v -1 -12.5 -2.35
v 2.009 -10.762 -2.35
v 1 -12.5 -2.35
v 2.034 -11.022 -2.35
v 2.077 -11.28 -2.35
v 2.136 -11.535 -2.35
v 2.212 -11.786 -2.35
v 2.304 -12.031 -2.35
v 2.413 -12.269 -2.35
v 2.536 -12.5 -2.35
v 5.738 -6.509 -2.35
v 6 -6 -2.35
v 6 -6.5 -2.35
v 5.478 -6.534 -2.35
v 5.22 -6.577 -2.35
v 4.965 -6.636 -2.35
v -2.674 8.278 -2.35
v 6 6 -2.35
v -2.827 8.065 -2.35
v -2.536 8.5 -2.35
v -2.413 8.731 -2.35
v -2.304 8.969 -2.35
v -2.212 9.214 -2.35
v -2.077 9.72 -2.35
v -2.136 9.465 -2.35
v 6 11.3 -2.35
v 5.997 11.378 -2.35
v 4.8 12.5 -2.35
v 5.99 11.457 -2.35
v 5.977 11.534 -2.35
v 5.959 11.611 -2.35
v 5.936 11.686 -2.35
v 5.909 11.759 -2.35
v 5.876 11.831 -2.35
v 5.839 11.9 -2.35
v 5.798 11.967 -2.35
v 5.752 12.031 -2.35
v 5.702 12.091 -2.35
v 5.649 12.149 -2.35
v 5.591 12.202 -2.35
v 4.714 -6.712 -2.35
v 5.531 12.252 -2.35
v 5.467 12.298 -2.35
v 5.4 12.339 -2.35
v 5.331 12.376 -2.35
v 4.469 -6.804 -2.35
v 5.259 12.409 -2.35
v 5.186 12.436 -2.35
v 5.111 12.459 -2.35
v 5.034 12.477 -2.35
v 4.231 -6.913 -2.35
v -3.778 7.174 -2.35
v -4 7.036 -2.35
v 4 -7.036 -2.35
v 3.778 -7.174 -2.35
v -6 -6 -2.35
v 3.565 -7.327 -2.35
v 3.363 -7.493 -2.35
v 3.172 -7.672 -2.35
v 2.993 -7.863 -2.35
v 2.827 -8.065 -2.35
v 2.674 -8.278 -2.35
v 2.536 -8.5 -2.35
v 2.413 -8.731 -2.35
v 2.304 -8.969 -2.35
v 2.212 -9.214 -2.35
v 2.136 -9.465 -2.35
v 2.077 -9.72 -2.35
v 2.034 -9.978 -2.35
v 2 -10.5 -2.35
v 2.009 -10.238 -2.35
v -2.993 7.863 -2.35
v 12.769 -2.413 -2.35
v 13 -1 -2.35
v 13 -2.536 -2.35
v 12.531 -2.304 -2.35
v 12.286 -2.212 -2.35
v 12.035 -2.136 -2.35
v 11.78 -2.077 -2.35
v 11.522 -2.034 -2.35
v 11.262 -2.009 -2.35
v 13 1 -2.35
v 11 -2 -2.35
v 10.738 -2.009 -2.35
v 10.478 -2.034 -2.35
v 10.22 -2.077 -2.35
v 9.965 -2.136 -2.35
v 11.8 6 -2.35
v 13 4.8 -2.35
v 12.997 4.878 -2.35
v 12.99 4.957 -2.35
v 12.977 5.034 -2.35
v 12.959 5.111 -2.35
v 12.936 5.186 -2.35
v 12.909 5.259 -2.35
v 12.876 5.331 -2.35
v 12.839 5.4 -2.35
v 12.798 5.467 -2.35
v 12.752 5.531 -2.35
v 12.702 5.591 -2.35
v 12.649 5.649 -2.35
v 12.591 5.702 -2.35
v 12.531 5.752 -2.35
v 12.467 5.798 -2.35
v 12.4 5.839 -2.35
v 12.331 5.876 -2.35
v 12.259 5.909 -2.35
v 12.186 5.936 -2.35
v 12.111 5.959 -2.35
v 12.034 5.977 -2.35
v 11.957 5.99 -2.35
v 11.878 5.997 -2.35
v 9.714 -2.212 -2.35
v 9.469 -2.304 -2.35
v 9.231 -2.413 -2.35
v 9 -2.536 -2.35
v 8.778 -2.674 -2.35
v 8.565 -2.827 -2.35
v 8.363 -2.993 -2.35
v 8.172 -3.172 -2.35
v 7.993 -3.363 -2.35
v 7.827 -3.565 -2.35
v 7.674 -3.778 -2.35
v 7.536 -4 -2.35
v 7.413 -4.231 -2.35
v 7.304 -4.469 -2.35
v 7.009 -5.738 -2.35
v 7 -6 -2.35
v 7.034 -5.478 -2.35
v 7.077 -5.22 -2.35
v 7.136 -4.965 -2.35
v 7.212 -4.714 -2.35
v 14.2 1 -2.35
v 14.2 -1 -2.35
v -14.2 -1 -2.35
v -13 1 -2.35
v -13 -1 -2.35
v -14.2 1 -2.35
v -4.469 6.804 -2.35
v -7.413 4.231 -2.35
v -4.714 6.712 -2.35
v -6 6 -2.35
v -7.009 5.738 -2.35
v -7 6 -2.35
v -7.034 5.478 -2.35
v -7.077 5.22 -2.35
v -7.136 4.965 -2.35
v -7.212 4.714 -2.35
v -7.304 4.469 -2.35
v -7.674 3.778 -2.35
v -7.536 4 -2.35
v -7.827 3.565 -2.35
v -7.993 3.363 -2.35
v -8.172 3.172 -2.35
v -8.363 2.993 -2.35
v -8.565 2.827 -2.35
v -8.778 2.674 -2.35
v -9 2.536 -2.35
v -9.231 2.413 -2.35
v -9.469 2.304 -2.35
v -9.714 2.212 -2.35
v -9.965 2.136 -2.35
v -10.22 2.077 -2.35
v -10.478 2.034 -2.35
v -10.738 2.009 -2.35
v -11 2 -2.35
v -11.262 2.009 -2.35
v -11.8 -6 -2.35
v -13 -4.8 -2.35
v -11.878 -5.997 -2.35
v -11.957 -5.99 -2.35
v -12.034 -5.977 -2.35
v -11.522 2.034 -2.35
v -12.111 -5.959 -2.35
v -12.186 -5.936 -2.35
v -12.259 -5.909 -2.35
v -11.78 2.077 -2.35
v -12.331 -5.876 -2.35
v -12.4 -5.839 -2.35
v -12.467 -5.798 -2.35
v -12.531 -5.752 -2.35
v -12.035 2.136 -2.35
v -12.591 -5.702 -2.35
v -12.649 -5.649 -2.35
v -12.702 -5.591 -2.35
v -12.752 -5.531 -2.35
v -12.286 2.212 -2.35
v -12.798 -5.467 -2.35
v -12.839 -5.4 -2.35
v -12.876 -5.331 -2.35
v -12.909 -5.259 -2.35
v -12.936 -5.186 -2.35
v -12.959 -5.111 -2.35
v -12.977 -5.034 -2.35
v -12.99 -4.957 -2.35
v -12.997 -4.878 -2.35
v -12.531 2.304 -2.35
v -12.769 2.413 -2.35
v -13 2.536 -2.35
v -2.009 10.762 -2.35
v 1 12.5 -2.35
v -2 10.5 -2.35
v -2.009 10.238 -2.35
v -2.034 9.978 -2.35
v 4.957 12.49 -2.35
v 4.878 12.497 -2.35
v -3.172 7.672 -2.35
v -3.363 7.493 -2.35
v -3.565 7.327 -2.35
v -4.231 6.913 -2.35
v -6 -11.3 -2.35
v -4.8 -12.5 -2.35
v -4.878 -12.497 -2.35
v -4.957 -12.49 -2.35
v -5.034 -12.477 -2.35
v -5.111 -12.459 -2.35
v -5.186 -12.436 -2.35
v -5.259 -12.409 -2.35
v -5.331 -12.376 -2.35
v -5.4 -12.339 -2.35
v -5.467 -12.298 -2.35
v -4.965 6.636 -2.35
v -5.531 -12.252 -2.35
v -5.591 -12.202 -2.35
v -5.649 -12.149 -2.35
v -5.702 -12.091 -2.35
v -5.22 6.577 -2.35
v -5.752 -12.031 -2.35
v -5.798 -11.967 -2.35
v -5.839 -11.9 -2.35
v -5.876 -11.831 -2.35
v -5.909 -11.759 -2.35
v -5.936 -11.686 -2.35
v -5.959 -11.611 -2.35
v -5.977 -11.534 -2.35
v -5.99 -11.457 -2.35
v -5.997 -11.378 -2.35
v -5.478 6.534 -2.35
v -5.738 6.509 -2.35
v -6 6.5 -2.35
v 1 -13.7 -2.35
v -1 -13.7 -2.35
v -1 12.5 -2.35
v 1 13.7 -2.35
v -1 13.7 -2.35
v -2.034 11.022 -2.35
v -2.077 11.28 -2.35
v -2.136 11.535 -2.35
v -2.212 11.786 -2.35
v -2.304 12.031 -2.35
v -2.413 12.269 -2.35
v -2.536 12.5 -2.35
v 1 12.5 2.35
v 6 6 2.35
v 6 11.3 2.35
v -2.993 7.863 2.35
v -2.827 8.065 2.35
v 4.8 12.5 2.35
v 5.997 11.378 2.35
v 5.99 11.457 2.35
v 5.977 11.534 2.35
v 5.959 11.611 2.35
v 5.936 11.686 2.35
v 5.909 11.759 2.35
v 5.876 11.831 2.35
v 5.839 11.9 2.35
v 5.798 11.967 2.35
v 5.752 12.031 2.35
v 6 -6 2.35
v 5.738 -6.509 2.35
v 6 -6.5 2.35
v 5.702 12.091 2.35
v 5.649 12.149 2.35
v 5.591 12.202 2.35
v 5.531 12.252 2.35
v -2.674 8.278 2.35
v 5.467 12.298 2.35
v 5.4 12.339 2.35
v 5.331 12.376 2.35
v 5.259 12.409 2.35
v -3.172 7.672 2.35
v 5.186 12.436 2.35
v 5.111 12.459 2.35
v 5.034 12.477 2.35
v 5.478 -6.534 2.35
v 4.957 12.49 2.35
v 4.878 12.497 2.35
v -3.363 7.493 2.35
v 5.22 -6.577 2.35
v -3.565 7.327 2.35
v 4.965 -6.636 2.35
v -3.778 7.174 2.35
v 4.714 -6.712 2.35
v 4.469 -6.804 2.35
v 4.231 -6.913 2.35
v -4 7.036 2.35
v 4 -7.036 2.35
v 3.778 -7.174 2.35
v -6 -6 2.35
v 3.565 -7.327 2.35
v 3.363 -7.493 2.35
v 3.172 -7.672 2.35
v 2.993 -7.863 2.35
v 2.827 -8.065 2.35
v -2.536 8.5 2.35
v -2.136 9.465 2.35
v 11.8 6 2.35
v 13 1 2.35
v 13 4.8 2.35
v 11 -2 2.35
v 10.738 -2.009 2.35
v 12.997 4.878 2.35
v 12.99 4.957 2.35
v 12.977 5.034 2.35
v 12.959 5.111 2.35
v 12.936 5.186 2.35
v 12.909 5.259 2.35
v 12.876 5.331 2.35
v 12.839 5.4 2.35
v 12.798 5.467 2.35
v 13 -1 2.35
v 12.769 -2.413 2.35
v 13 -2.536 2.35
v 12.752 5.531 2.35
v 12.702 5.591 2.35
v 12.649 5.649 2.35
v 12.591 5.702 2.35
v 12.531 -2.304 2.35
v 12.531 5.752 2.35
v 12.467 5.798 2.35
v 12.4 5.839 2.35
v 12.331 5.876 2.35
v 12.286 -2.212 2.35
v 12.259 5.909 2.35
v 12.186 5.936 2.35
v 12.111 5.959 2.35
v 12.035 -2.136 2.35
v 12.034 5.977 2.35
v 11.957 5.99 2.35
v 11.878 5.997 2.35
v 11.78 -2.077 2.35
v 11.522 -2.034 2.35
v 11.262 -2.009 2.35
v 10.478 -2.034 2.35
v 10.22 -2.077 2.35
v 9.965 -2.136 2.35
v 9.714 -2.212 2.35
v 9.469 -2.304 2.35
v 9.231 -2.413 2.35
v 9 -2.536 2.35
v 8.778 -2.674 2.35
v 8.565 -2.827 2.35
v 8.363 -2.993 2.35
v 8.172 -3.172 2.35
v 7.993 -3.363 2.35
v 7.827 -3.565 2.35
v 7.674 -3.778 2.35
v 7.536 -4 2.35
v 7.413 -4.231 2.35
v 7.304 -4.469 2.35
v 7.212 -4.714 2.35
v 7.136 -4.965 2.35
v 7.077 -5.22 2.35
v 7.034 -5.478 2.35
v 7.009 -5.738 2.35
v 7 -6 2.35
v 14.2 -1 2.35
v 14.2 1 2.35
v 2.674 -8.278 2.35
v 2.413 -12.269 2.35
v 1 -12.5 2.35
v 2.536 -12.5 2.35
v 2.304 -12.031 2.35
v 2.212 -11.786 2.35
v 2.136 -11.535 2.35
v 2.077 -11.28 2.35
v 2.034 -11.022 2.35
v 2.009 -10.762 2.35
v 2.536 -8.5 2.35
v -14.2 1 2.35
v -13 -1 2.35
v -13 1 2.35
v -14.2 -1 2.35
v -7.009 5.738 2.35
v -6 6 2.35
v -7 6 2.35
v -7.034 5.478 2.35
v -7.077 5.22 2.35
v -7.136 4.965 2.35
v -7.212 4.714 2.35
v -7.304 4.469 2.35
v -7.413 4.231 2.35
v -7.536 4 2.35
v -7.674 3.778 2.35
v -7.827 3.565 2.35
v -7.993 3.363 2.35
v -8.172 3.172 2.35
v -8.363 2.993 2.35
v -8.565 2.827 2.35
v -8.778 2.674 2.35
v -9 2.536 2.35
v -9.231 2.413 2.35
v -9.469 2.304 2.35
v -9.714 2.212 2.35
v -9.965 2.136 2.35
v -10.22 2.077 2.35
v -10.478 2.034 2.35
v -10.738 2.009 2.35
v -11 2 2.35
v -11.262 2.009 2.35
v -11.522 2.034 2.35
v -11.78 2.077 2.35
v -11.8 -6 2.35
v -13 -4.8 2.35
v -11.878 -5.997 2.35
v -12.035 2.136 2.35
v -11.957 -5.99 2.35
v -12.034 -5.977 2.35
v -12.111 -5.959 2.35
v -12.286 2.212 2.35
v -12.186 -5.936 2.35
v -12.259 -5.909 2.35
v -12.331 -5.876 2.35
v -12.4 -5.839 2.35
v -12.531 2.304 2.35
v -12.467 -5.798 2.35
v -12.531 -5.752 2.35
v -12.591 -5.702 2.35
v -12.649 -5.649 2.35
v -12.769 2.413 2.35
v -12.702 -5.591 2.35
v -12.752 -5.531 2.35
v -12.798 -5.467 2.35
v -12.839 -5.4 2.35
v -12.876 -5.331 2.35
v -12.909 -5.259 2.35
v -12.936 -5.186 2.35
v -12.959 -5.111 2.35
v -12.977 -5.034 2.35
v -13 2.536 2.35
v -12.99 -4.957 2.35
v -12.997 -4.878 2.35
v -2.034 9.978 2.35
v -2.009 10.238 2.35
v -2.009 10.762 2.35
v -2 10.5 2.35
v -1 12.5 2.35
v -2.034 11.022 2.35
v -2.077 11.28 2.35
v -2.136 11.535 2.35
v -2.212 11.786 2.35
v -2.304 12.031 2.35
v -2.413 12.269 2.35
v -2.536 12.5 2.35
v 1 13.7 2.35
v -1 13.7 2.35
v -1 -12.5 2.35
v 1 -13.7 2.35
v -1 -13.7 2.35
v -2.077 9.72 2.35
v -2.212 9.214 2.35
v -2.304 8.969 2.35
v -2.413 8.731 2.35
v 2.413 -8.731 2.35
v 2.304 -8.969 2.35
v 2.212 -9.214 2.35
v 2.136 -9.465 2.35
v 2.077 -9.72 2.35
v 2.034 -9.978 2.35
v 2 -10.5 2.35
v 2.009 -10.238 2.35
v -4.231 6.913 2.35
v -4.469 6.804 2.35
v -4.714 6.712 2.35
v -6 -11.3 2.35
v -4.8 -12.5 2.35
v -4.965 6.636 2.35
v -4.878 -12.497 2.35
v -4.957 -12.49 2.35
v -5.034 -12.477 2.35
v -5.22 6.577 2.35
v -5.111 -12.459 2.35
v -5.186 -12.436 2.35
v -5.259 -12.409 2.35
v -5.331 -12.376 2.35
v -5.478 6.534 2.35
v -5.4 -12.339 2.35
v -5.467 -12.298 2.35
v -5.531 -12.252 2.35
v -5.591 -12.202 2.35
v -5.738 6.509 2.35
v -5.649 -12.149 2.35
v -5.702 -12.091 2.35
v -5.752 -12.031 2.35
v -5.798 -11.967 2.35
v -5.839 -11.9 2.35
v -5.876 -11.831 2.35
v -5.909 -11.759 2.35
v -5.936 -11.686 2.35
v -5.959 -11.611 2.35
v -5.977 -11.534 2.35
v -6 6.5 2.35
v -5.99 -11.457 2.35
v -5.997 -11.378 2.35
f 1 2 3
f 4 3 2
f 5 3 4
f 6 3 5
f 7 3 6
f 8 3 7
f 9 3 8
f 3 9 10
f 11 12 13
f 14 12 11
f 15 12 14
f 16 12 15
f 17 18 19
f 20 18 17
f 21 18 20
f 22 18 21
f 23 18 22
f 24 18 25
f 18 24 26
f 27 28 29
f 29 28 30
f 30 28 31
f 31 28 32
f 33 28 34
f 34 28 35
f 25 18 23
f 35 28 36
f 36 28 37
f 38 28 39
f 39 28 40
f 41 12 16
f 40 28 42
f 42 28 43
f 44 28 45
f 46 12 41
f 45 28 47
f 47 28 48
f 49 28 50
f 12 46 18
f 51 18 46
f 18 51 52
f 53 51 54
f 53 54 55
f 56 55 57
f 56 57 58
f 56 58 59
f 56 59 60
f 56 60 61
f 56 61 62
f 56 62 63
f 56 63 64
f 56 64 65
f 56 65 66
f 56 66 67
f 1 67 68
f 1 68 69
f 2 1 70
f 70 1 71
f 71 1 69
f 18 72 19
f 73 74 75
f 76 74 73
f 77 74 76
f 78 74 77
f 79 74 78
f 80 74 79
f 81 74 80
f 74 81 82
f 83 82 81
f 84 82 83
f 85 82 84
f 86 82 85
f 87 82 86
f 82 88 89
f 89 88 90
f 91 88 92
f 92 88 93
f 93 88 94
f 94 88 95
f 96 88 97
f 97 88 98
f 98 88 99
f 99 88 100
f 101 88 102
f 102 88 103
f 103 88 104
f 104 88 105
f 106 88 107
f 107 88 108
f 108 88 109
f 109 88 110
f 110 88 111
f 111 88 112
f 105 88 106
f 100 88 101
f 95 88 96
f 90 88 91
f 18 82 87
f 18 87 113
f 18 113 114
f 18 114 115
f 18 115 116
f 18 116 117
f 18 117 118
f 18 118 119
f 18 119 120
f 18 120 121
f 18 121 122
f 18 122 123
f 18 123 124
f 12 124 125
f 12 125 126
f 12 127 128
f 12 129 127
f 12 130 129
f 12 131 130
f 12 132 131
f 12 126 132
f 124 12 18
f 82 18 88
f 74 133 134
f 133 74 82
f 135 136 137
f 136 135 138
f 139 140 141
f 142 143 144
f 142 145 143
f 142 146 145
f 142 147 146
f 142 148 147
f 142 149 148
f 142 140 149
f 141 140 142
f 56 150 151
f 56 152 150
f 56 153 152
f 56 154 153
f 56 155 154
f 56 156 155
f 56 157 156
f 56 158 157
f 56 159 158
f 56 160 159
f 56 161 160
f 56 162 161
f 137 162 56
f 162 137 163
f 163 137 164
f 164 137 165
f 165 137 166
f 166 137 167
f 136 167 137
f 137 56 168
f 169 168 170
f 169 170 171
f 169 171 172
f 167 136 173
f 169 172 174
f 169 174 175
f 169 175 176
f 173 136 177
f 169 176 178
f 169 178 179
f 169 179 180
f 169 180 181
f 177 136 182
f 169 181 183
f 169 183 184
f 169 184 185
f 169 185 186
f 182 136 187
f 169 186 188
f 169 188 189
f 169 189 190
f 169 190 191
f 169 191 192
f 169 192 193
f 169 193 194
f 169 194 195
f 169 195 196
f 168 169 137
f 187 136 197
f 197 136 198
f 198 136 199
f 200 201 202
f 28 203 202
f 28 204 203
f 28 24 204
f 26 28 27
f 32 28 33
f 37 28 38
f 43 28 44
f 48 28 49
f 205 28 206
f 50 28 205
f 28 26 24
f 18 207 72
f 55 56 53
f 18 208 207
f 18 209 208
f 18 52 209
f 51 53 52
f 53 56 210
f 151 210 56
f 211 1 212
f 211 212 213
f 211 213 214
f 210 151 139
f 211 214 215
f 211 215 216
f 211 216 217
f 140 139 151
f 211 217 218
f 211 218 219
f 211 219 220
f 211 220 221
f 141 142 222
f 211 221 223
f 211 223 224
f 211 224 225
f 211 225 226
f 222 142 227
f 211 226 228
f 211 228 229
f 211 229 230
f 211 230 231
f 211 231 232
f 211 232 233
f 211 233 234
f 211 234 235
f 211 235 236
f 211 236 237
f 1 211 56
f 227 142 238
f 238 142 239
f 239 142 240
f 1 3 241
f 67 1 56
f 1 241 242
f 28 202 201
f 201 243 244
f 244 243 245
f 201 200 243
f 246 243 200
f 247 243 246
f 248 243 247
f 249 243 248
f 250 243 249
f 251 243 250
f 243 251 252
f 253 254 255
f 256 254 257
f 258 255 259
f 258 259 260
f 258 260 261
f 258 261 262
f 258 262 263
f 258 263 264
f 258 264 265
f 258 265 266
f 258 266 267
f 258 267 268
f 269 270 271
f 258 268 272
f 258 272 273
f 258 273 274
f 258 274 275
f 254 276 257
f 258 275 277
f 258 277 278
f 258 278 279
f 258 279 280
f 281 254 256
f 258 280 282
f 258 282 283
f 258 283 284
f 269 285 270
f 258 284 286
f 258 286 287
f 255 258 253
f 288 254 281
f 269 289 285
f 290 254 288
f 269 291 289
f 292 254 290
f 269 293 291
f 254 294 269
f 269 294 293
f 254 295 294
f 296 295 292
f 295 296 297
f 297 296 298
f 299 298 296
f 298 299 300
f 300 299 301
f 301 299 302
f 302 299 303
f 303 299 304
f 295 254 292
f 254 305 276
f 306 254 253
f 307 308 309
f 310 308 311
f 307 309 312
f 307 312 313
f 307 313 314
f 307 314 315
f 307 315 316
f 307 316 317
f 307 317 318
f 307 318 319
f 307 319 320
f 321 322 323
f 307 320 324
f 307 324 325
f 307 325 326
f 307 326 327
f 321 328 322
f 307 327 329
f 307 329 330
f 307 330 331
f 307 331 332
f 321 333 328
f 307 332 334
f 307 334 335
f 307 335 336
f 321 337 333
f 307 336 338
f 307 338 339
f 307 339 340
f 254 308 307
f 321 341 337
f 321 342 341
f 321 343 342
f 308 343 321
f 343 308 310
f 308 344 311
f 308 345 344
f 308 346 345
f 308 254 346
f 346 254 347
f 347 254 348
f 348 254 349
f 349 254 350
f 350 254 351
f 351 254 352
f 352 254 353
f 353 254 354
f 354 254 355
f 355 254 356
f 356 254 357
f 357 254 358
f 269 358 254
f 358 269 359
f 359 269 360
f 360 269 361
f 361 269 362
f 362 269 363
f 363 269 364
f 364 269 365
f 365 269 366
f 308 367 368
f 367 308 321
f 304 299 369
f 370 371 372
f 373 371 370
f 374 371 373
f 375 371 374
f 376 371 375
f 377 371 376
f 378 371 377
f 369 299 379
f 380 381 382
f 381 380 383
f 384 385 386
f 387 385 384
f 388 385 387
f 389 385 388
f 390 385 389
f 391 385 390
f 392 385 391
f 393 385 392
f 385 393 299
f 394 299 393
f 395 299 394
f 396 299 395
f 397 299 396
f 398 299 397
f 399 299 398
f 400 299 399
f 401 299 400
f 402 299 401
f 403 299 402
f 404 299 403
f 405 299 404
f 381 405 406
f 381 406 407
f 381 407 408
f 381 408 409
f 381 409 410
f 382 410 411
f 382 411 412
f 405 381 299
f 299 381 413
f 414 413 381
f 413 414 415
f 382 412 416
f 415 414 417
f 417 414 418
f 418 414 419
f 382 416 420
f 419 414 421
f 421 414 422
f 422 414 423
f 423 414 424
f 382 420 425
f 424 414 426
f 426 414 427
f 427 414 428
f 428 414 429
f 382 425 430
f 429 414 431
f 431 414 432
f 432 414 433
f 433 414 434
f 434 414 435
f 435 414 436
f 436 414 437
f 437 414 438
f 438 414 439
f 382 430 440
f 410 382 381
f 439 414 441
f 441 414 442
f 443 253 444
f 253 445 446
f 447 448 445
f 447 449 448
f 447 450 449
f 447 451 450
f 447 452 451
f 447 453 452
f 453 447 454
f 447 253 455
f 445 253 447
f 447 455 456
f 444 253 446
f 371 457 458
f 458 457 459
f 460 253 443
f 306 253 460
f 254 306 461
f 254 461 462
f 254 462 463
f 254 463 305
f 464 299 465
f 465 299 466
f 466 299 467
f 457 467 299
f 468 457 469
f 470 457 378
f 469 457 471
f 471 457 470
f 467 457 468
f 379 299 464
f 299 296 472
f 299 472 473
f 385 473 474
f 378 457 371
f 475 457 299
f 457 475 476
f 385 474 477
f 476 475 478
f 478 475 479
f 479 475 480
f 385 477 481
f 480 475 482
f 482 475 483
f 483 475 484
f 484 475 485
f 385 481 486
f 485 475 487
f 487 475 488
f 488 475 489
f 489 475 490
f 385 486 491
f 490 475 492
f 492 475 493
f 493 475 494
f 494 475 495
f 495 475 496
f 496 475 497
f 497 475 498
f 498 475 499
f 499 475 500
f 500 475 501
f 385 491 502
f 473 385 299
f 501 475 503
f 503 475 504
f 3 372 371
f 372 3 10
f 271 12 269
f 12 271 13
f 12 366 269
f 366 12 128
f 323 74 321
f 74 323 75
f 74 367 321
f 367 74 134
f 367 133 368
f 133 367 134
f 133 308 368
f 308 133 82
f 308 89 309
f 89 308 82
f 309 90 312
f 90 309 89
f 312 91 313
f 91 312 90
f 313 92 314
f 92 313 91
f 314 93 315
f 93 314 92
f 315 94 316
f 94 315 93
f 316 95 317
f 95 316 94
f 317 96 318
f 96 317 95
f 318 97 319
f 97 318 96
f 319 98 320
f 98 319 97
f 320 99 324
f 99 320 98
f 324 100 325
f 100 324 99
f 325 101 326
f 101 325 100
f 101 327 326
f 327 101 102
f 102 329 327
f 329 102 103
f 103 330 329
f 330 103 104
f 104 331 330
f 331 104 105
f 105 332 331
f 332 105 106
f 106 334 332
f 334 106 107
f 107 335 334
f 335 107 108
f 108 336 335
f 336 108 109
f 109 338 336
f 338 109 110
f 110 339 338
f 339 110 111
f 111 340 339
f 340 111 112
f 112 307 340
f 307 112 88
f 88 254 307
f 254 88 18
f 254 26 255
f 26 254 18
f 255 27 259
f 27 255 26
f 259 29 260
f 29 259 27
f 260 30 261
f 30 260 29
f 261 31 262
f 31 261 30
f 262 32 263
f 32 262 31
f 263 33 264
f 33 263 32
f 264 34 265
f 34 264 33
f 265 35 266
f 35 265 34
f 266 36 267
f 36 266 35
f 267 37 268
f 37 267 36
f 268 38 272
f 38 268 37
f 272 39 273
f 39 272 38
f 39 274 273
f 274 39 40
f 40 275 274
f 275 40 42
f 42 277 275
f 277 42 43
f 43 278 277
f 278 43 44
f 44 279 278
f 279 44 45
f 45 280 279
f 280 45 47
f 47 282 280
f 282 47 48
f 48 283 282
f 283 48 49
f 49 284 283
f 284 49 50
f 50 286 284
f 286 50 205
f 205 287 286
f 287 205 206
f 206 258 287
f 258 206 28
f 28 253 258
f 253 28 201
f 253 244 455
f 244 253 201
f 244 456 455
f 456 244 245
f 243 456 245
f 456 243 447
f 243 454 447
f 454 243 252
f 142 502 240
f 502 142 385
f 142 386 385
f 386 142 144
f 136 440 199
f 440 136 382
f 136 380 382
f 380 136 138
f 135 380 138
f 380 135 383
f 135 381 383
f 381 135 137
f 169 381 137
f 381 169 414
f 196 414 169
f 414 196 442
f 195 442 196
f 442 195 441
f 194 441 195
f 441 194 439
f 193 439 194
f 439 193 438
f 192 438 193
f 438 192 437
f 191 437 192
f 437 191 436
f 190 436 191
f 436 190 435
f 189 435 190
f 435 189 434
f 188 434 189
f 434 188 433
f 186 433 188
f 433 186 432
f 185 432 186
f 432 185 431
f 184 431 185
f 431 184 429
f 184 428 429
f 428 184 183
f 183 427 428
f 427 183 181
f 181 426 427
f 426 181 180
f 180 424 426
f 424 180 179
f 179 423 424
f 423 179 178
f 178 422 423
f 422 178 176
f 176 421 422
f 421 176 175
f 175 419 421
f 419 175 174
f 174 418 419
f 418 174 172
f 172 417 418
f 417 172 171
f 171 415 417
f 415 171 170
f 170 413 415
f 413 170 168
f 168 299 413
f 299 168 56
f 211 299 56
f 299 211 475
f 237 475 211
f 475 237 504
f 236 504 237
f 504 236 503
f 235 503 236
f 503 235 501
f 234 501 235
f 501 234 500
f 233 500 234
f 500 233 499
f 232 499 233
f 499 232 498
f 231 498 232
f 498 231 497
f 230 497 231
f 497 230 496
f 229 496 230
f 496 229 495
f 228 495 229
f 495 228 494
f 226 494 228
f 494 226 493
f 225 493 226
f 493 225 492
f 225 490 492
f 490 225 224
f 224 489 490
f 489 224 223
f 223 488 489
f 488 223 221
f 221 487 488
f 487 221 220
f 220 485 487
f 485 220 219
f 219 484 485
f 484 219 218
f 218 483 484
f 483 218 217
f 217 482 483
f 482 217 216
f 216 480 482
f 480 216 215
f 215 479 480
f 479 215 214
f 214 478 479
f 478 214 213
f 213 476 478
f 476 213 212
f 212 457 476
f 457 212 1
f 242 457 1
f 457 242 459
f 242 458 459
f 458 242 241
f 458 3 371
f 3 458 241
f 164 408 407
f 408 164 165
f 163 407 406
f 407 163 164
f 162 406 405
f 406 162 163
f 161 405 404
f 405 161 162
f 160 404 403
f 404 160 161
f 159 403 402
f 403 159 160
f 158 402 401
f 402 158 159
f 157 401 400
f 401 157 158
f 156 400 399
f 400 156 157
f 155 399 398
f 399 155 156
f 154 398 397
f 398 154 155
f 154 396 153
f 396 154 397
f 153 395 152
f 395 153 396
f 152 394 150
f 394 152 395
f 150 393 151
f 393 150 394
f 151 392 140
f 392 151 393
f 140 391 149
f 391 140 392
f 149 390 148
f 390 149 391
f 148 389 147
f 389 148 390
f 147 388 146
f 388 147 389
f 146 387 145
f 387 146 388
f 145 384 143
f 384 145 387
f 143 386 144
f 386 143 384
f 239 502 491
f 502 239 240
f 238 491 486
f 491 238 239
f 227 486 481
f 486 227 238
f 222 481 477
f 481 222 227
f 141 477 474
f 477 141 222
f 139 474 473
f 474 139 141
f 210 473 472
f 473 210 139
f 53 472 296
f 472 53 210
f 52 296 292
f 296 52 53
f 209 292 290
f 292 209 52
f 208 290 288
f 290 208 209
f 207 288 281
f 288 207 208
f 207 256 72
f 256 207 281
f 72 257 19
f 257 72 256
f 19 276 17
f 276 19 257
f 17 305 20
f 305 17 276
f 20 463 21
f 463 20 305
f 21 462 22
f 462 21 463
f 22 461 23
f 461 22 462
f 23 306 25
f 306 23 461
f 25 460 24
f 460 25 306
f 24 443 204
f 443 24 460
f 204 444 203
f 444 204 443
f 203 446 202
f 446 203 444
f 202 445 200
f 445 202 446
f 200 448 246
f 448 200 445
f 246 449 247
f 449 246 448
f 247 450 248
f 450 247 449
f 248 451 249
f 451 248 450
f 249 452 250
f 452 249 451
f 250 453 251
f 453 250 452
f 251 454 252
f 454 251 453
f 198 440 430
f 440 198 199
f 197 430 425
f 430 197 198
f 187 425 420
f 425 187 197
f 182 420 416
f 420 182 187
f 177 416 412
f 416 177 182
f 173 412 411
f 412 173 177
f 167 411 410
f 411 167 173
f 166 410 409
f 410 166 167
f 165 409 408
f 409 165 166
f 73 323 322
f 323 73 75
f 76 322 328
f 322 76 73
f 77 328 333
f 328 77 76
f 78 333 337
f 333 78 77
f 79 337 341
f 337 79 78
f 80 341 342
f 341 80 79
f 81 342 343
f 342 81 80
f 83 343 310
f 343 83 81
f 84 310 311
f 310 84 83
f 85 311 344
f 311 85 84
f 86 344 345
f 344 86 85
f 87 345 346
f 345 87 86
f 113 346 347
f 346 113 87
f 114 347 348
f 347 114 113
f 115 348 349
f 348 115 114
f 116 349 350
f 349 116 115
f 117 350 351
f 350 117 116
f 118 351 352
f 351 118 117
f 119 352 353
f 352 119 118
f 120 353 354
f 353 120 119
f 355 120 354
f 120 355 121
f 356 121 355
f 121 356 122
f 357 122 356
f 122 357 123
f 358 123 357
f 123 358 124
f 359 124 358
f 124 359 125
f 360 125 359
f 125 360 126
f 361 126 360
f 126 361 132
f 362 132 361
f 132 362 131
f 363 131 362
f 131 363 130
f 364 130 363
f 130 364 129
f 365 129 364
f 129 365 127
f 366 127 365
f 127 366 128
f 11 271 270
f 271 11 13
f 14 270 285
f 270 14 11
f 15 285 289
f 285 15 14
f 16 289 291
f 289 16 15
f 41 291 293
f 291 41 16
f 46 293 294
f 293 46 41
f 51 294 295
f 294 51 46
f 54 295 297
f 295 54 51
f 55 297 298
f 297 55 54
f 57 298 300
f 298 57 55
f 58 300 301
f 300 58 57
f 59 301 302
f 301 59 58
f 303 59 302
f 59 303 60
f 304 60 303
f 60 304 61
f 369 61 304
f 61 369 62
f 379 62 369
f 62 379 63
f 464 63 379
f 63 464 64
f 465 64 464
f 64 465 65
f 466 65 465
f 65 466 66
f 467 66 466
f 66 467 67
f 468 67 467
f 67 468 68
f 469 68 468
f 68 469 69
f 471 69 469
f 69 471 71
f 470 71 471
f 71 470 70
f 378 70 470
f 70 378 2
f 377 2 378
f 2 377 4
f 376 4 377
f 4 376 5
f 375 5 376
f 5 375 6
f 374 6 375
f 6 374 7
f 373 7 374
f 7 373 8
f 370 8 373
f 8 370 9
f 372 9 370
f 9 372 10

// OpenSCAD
$fn = 96;

// A extrusion bracket overall size: [26, 25, 4.7]
overall_x = 26;
overall_y = 25;
thickness = 4.7;

// Cross arm widths (chosen to match the shown "plus" silhouette)
arm_w_y = 12;  // width of horizontal arm (in Y)
arm_w_x = 12;  // width of vertical arm (in X)

// Outer corner rounding
corner_r = 1.2;

// Semicircular side cutouts (as in the renders)
cutout_d = 8.0;
cutout_r = cutout_d/2;

// How far the cutout centers sit from the outer edge (controls "bite" depth)
cutout_edge_inset = 2.0;

// Robust boolean overlap
eps = 0.25;

// Connectivity fix: add a thin "web" that bridges any accidental slice segmentation
// seen in some renderers/exports (1–2mm overlap requirement).
bridge_overlap = 1.2;   // mm (ensures continuous solid along length)
bridge_w = 2.0;         // mm (thin, does not change silhouette noticeably)

// 2D rounded rectangle centered at origin
module rounded_rect_centered_2d(w, h, r) {
    r2 = min(r, w/2, h/2);
    hull() {
        translate([ w/2 - r2,  h/2 - r2]) circle(r=r2);
        translate([-w/2 + r2,  h/2 - r2]) circle(r=r2);
        translate([ w/2 - r2, -h/2 + r2]) circle(r=r2);
        translate([-w/2 + r2, -h/2 + r2]) circle(r=r2);
    }
}

// Base "plus" plate (one connected solid)
module plus_plate_2d() {
    union() {
        // Horizontal bar: overall_x by arm_w_y
        rounded_rect_centered_2d(overall_x, arm_w_y, corner_r);

        // Vertical bar: arm_w_x by overall_y
        rounded_rect_centered_2d(arm_w_x, overall_y, corner_r);

        // Structural bridge web (ensures no thin slice-like disconnected segments)
        // Overlaps both bars by bridge_overlap to guarantee attachment.
        square([overall_x + 2*bridge_overlap, bridge_w], center=true);
        square([bridge_w, overall_y + 2*bridge_overlap], center=true);
    }
}

// Side semicircular cutouts (two per side, alternating like the views)
module side_cutouts_2d() {
    x_edge = overall_x/2;
    y_edge = overall_y/2;

    x_c = x_edge - cutout_edge_inset; // centers near left/right edges
    y_c = y_edge - cutout_edge_inset; // centers near top/bottom edges

    // Left side: upper cutout
    translate([-x_c,  arm_w_y/2]) circle(r=cutout_r);

    // Right side: lower cutout
    translate([ x_c, -arm_w_y/2]) circle(r=cutout_r);

    // Top side: left cutout
    translate([-arm_w_x/2,  y_c]) circle(r=cutout_r);

    // Bottom side: right cutout
    translate([ arm_w_x/2, -y_c]) circle(r=cutout_r);
}

// Final solid (explicit union to guarantee single connected body)
union() {
    difference() {
        linear_extrude(height=thickness, center=true, convexity=10)
            plus_plate_2d();

        // Through-cut the semicircular notches (slightly taller for clean boolean)
        linear_extrude(height=thickness + 2*eps, center=true, convexity=10)
            side_cutouts_2d();
    }
}
